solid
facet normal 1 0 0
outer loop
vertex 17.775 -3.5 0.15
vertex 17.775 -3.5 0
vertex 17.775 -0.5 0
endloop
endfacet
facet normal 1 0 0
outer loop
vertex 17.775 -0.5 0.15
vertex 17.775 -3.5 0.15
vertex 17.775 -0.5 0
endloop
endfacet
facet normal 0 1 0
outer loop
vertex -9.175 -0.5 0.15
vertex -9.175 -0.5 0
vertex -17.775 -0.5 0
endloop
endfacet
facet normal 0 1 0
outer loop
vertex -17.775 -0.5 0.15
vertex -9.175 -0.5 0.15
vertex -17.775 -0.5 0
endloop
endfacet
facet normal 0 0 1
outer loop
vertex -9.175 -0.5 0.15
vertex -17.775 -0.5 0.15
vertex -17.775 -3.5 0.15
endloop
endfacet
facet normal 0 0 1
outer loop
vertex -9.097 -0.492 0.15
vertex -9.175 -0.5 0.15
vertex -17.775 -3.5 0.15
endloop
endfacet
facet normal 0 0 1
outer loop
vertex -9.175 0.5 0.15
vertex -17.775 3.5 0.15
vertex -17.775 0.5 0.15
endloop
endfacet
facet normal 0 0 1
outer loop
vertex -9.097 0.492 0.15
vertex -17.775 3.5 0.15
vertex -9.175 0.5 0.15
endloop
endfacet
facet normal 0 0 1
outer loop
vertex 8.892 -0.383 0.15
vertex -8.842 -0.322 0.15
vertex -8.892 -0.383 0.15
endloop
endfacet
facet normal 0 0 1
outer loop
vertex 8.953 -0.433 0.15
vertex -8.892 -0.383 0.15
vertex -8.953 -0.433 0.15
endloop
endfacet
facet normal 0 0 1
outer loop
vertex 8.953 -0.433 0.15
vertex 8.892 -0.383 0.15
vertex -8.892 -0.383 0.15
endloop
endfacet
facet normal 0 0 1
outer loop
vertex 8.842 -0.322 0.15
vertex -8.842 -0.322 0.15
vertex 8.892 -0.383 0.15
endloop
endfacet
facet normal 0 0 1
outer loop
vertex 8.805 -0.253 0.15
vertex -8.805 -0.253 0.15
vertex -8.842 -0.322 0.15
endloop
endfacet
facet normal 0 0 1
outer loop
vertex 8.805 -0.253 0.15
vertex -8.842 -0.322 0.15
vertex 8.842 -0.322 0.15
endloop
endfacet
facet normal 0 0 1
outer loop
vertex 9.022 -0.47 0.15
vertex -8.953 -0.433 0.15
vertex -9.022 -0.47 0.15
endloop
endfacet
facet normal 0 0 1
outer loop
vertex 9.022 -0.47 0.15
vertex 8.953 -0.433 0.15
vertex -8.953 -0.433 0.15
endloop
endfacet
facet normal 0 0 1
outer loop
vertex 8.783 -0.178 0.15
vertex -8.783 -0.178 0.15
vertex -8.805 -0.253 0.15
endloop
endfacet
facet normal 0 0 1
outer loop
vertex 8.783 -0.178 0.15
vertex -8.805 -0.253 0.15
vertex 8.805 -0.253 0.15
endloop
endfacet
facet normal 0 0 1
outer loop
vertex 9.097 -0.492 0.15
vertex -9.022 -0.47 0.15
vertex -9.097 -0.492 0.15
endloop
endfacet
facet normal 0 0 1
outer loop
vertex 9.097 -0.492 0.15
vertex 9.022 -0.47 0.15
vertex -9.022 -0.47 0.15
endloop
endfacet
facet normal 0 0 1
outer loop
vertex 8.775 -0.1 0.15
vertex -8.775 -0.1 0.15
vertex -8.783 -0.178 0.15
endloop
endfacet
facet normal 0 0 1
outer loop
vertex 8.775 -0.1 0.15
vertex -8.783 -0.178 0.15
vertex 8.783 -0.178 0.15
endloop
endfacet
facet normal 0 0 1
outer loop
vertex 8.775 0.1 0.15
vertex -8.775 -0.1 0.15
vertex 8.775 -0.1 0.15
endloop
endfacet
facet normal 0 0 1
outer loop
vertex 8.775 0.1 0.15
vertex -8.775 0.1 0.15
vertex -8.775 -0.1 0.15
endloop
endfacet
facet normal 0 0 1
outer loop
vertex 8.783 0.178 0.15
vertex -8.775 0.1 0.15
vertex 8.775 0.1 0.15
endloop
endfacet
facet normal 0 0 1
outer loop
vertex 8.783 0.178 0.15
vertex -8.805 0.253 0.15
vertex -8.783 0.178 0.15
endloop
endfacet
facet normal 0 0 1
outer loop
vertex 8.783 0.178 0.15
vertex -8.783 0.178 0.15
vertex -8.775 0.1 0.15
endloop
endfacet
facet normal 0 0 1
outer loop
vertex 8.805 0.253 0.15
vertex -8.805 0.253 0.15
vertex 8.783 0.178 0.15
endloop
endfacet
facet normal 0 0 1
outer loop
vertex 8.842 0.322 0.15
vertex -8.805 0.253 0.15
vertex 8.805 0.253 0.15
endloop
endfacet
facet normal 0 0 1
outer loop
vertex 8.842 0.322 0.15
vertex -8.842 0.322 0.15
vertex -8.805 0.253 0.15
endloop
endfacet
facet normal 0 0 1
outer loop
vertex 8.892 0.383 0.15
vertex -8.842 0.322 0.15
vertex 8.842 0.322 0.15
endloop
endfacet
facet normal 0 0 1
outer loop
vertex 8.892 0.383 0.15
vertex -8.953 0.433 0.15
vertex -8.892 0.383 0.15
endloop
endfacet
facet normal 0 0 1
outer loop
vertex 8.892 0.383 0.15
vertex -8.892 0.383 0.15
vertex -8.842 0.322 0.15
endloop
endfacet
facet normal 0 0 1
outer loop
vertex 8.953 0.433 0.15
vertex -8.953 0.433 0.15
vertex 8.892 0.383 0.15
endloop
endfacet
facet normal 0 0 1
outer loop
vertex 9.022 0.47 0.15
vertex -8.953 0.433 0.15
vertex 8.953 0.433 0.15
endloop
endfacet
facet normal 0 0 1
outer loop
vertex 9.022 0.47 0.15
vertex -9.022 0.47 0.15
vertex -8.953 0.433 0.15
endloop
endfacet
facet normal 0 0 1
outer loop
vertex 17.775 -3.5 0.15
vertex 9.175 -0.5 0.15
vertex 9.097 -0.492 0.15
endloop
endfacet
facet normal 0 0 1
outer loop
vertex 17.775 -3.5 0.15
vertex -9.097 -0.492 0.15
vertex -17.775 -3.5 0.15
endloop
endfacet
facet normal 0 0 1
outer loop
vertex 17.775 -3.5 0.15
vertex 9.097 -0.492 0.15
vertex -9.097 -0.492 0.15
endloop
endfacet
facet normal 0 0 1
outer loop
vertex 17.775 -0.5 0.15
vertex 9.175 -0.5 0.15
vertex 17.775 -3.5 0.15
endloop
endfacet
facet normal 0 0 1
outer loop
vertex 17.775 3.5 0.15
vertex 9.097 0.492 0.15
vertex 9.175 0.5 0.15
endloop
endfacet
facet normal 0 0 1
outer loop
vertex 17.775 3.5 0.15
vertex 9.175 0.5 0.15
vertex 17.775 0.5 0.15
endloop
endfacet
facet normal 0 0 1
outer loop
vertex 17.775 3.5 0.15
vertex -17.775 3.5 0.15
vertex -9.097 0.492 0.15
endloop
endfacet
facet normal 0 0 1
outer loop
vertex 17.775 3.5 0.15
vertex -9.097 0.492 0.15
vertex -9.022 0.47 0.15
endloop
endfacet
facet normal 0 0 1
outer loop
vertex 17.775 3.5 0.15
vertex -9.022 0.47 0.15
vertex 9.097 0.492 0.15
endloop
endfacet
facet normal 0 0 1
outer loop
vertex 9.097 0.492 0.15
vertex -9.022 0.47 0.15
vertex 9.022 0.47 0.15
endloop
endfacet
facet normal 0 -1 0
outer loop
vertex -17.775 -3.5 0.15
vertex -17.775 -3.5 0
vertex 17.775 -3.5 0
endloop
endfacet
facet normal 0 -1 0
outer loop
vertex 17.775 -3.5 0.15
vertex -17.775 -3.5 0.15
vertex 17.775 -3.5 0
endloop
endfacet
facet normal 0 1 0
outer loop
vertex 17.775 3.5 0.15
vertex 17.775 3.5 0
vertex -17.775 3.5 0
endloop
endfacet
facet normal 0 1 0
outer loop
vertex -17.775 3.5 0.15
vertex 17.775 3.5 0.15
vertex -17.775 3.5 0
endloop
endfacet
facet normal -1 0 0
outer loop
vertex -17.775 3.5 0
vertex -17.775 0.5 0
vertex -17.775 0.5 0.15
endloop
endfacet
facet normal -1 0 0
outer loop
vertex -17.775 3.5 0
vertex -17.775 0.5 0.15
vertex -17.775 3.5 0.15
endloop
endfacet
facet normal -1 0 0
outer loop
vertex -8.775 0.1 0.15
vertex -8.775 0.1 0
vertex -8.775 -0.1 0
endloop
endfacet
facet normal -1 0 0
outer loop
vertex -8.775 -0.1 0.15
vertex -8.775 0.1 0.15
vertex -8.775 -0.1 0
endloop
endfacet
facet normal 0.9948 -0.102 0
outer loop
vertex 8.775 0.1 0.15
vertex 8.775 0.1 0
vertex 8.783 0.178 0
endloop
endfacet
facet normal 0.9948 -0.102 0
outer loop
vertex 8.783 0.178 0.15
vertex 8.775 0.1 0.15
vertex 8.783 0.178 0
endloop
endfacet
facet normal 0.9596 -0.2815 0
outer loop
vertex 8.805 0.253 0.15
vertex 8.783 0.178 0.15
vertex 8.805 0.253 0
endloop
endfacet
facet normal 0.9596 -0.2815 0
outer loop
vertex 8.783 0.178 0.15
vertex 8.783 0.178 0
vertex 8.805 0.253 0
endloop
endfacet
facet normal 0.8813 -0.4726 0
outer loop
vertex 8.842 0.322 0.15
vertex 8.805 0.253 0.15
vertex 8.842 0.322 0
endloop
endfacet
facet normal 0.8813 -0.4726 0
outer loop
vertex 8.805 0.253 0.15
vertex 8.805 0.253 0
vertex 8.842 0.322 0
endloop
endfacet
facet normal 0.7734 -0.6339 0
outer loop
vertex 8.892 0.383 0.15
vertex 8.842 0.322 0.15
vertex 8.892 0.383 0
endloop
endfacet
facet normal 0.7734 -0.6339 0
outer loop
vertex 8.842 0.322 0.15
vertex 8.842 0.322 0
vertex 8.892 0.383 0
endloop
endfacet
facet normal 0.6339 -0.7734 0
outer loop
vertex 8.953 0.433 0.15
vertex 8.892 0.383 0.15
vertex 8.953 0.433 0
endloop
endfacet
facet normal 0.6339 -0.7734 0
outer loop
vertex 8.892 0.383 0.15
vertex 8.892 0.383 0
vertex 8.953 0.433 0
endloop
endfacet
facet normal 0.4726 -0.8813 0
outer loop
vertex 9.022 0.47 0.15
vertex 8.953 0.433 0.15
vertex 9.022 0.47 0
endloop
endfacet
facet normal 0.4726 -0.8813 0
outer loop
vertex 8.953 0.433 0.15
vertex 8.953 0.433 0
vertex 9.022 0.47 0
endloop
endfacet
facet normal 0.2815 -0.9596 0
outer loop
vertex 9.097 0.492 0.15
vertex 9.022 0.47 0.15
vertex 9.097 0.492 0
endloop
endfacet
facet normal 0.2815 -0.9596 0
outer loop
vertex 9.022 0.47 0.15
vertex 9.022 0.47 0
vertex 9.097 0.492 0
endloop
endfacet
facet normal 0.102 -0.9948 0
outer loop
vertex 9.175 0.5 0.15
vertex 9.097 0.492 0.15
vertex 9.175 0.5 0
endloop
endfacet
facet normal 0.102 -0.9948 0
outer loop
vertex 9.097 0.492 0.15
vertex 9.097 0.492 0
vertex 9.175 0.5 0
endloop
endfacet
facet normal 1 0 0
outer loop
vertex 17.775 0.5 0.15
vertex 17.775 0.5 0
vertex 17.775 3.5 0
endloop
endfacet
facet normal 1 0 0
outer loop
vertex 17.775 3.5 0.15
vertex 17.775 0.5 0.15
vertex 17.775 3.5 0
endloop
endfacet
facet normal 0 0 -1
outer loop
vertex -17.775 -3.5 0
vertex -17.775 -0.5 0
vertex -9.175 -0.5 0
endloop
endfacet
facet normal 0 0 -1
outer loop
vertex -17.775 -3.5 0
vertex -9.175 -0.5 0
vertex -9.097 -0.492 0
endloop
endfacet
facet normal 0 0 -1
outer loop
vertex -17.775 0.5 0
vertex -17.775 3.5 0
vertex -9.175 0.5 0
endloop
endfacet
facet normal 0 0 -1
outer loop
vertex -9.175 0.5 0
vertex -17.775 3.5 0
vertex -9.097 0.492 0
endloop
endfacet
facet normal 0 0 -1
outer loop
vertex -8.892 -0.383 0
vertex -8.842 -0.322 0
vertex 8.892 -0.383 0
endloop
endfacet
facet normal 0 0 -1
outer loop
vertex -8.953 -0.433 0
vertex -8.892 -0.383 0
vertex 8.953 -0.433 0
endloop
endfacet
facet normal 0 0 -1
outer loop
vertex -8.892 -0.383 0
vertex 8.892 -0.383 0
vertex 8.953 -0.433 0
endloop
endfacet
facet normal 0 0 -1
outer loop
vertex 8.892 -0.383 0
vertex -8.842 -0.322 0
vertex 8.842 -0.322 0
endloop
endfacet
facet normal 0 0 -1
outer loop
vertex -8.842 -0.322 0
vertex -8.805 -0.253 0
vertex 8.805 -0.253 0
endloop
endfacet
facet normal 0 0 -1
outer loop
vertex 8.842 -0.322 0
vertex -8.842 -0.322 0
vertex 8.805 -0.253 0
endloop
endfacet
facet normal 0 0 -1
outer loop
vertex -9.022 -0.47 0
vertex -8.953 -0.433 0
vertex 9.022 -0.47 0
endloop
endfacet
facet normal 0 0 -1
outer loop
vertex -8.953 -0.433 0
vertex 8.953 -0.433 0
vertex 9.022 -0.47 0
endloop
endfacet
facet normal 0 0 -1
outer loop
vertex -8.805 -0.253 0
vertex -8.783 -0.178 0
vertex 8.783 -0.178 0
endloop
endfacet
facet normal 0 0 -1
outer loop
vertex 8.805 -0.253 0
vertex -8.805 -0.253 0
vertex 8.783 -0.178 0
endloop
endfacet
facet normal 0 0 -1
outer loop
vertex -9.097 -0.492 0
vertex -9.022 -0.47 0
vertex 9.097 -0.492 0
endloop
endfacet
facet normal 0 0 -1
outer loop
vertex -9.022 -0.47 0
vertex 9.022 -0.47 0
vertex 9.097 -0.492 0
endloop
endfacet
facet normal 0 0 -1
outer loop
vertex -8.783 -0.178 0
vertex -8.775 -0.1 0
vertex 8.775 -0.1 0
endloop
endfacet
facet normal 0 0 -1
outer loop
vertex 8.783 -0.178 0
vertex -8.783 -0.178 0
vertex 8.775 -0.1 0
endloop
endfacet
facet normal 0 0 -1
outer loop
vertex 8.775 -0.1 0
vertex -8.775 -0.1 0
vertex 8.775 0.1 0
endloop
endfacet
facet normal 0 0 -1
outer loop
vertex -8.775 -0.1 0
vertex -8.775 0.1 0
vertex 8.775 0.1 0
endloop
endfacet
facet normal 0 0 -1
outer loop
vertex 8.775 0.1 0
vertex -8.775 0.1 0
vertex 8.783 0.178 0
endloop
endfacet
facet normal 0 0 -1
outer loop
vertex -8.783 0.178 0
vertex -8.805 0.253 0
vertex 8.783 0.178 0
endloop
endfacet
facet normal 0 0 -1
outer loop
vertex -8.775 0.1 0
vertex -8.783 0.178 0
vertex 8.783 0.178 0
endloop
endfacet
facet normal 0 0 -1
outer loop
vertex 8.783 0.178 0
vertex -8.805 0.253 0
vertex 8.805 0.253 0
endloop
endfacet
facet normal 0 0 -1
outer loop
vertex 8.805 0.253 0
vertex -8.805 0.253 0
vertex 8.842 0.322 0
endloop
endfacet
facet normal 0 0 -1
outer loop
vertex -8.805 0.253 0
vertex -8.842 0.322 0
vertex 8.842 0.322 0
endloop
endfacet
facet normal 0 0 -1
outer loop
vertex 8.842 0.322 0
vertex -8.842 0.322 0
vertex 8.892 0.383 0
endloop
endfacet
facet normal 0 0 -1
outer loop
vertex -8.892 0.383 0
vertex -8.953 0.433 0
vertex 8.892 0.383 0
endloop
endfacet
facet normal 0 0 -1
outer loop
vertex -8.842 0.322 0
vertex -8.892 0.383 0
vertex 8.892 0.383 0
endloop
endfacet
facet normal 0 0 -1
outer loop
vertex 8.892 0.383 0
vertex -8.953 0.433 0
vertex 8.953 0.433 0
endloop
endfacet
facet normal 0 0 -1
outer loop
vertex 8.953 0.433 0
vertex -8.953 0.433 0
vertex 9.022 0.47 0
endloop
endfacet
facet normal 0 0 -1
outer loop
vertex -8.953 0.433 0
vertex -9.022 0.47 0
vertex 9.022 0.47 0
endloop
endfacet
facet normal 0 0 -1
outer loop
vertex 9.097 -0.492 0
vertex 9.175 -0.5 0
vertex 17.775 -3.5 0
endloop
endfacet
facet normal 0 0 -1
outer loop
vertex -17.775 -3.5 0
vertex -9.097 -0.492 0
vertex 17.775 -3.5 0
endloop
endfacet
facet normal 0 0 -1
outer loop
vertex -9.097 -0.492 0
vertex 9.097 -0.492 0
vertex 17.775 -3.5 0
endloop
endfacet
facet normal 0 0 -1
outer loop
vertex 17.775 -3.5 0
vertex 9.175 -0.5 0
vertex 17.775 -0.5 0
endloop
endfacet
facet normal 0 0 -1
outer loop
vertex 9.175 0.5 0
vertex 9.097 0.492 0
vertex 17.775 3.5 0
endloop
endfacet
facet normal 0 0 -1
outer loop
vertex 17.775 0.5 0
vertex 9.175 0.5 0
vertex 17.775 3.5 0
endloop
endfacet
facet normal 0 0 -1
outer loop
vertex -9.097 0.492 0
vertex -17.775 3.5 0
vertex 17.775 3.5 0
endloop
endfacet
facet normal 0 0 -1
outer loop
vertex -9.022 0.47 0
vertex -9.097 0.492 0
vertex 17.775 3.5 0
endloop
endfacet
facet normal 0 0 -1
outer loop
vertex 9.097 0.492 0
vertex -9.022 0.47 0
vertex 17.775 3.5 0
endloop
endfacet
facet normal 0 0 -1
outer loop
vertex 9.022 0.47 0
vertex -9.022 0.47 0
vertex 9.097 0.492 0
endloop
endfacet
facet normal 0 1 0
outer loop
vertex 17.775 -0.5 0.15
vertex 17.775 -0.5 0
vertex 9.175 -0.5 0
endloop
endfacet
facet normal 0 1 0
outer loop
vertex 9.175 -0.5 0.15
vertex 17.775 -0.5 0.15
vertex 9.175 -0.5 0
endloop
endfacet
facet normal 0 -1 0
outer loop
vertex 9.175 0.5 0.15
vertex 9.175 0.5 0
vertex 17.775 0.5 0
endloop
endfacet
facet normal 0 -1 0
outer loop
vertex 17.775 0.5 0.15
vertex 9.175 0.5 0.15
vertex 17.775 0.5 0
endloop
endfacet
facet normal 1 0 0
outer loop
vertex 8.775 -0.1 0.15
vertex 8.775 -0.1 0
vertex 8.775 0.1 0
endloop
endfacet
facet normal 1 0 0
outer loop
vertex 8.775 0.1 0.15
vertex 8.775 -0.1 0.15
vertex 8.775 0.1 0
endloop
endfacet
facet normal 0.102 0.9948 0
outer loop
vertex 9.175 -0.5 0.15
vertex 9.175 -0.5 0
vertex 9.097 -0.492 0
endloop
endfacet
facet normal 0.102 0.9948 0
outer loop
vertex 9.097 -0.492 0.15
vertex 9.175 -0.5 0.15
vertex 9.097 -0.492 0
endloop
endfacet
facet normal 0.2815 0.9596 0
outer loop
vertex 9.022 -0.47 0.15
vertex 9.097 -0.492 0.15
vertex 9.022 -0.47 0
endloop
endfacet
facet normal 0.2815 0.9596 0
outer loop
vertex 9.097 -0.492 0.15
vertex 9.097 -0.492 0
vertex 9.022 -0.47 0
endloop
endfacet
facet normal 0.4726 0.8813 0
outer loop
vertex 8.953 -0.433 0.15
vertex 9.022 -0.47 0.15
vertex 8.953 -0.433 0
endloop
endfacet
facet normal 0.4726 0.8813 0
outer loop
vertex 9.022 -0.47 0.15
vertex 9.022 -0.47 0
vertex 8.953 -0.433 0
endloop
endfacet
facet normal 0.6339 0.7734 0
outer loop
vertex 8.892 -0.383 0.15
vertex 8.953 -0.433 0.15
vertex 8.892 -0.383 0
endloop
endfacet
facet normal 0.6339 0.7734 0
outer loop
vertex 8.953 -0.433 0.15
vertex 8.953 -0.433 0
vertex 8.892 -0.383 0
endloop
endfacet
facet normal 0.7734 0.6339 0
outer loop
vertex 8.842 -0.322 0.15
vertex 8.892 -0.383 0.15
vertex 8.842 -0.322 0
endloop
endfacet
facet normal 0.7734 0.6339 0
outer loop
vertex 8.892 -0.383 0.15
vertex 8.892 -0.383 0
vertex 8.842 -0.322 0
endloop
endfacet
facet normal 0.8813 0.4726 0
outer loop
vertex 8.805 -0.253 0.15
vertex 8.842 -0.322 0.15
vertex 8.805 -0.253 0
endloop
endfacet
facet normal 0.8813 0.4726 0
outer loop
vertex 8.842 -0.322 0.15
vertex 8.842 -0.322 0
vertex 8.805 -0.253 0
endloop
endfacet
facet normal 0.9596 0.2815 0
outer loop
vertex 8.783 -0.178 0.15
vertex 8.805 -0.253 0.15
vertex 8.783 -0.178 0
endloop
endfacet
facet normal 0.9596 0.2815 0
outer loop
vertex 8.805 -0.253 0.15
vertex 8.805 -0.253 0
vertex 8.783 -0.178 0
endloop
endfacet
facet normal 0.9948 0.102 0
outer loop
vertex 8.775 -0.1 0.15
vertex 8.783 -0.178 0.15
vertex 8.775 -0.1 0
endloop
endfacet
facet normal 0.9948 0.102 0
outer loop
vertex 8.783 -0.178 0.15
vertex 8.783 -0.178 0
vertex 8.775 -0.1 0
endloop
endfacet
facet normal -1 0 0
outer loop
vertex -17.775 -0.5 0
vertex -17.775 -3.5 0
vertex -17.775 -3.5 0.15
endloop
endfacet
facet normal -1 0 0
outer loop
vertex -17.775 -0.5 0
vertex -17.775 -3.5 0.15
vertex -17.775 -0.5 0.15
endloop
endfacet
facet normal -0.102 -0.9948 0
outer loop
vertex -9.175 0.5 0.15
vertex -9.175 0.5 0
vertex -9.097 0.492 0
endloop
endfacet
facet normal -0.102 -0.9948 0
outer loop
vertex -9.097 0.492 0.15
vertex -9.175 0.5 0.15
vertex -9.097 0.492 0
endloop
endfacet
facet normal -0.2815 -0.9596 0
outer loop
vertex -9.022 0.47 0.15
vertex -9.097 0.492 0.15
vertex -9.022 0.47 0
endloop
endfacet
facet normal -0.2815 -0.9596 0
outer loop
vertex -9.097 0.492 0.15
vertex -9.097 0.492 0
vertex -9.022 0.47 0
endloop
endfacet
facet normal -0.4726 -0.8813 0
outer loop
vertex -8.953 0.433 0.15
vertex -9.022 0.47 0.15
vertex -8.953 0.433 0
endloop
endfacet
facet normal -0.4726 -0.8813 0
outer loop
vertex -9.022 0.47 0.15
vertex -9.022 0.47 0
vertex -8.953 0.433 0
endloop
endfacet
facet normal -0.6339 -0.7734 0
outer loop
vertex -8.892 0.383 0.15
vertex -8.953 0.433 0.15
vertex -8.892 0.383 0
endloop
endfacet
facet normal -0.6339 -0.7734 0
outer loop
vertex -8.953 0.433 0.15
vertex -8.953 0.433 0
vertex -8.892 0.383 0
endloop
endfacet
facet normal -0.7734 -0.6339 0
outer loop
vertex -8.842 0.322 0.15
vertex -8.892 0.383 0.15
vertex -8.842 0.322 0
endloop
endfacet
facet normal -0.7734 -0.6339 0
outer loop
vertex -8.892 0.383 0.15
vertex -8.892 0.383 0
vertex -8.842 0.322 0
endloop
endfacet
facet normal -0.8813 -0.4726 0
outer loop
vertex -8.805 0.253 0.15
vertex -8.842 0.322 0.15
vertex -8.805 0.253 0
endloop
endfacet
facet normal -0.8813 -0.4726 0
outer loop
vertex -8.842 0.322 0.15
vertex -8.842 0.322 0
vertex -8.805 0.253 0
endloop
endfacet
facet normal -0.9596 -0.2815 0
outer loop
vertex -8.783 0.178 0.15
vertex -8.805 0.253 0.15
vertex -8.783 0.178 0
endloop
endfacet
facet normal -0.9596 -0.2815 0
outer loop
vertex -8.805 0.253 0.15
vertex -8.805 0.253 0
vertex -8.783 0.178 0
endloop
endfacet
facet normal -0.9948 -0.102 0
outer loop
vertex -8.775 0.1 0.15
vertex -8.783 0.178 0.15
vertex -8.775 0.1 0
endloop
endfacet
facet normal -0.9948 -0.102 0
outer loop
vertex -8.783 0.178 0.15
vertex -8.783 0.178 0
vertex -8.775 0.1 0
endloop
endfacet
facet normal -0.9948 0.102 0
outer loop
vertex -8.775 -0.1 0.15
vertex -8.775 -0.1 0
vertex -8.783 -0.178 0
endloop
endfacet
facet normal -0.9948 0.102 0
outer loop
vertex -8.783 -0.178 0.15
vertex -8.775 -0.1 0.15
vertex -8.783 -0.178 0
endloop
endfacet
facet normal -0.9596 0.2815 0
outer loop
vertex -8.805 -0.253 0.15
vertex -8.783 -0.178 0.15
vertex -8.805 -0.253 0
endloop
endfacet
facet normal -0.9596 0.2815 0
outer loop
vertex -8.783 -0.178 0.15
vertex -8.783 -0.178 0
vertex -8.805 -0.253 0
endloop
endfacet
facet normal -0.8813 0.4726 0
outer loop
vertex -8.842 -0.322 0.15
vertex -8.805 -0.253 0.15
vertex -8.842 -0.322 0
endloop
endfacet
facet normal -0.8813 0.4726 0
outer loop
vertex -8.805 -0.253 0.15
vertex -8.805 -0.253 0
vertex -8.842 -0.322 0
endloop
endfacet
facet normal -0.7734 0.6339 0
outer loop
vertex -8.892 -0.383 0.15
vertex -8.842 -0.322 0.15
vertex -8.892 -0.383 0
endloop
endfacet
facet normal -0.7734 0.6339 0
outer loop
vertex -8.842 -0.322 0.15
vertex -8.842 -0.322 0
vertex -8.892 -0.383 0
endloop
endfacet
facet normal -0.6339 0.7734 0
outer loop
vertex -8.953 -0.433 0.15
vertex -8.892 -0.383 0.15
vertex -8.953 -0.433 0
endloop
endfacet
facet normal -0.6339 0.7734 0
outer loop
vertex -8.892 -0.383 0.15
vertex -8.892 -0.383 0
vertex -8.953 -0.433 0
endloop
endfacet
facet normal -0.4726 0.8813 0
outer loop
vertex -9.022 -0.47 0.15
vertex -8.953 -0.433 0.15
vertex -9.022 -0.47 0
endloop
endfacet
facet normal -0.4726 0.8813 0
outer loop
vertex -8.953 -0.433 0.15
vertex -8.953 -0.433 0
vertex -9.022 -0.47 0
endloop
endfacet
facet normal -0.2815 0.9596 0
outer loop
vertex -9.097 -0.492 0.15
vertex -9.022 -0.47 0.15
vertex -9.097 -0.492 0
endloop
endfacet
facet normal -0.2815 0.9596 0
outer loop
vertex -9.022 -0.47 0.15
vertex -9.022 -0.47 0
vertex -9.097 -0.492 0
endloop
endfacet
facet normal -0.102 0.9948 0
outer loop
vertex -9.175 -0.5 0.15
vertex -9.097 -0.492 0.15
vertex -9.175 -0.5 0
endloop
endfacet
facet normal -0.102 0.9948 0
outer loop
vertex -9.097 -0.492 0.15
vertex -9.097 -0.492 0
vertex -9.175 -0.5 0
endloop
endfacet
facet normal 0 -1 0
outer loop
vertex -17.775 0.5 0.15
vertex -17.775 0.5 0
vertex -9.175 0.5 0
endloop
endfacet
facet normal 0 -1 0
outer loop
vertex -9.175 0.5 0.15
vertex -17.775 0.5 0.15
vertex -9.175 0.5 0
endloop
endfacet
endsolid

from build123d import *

# Parameters (mm, degrees)
F0_W     = 4
F0_H     = 3
F1_DEPTH = 0.15


# Not quite as in the source:
# - a feature names something its author has since deleted; it is built from what else it names


with BuildPart() as f1:
    # F0 (on Top) → F1 (new body)
    with BuildSketch(Plane.XY):
        with BuildLine():
            ThreePointArc((-8.775, -0.1), (-8.8921572875, -0.3828427125), (-9.175, -0.5))
            Line((-9.175, -0.5), (-13.775, -0.5))
            Line((-13.775, -0.5), (-13.775, -3.5))
            Line((-13.775, -3.5), (0, -3.5))
            Line((0, -3.5), (0, 3.5))
            Line((0, 3.5), (-13.775, 3.5))
            Line((-13.775, 3.5), (-13.775, 0.5))
            Line((-13.775, 0.5), (-9.175, 0.5))
            ThreePointArc((-9.175, 0.5), (-8.8921572875, 0.3828427125), (-8.775, 0.1))
            Line((-8.775, 0.1), (-8.775, -0.1))
        make_face()
        with Locations((-15.775, -2)):
            Rectangle(F0_W, F0_H)
        with BuildLine():
            Line((0, 3.5), (0, -3.5))
            Line((0, -3.5), (13.775, -3.5))
            Line((13.775, -3.5), (13.775, -0.5))
            Line((13.775, -0.5), (9.175, -0.5))
            ThreePointArc((9.175, -0.5), (8.8921572875, -0.3828427125), (8.775, -0.1))
            Line((8.775, -0.1), (8.775, 0.1))
            ThreePointArc((8.775, 0.1), (8.8921572875, 0.3828427125), (9.175, 0.5))
            Line((9.175, 0.5), (13.775, 0.5))
            Line((13.775, 0.5), (13.775, 3.5))
            Line((13.775, 3.5), (0, 3.5))
        make_face()
        with Locations((15.775, -2)):
            Rectangle(F0_W, F0_H)
        with Locations((-15.775, 2)):
            Rectangle(F0_W, F0_H)
        with Locations((15.775, 2)):
            Rectangle(F0_W, F0_H)
    extrude(amount=F1_DEPTH)


solid = f1.part
